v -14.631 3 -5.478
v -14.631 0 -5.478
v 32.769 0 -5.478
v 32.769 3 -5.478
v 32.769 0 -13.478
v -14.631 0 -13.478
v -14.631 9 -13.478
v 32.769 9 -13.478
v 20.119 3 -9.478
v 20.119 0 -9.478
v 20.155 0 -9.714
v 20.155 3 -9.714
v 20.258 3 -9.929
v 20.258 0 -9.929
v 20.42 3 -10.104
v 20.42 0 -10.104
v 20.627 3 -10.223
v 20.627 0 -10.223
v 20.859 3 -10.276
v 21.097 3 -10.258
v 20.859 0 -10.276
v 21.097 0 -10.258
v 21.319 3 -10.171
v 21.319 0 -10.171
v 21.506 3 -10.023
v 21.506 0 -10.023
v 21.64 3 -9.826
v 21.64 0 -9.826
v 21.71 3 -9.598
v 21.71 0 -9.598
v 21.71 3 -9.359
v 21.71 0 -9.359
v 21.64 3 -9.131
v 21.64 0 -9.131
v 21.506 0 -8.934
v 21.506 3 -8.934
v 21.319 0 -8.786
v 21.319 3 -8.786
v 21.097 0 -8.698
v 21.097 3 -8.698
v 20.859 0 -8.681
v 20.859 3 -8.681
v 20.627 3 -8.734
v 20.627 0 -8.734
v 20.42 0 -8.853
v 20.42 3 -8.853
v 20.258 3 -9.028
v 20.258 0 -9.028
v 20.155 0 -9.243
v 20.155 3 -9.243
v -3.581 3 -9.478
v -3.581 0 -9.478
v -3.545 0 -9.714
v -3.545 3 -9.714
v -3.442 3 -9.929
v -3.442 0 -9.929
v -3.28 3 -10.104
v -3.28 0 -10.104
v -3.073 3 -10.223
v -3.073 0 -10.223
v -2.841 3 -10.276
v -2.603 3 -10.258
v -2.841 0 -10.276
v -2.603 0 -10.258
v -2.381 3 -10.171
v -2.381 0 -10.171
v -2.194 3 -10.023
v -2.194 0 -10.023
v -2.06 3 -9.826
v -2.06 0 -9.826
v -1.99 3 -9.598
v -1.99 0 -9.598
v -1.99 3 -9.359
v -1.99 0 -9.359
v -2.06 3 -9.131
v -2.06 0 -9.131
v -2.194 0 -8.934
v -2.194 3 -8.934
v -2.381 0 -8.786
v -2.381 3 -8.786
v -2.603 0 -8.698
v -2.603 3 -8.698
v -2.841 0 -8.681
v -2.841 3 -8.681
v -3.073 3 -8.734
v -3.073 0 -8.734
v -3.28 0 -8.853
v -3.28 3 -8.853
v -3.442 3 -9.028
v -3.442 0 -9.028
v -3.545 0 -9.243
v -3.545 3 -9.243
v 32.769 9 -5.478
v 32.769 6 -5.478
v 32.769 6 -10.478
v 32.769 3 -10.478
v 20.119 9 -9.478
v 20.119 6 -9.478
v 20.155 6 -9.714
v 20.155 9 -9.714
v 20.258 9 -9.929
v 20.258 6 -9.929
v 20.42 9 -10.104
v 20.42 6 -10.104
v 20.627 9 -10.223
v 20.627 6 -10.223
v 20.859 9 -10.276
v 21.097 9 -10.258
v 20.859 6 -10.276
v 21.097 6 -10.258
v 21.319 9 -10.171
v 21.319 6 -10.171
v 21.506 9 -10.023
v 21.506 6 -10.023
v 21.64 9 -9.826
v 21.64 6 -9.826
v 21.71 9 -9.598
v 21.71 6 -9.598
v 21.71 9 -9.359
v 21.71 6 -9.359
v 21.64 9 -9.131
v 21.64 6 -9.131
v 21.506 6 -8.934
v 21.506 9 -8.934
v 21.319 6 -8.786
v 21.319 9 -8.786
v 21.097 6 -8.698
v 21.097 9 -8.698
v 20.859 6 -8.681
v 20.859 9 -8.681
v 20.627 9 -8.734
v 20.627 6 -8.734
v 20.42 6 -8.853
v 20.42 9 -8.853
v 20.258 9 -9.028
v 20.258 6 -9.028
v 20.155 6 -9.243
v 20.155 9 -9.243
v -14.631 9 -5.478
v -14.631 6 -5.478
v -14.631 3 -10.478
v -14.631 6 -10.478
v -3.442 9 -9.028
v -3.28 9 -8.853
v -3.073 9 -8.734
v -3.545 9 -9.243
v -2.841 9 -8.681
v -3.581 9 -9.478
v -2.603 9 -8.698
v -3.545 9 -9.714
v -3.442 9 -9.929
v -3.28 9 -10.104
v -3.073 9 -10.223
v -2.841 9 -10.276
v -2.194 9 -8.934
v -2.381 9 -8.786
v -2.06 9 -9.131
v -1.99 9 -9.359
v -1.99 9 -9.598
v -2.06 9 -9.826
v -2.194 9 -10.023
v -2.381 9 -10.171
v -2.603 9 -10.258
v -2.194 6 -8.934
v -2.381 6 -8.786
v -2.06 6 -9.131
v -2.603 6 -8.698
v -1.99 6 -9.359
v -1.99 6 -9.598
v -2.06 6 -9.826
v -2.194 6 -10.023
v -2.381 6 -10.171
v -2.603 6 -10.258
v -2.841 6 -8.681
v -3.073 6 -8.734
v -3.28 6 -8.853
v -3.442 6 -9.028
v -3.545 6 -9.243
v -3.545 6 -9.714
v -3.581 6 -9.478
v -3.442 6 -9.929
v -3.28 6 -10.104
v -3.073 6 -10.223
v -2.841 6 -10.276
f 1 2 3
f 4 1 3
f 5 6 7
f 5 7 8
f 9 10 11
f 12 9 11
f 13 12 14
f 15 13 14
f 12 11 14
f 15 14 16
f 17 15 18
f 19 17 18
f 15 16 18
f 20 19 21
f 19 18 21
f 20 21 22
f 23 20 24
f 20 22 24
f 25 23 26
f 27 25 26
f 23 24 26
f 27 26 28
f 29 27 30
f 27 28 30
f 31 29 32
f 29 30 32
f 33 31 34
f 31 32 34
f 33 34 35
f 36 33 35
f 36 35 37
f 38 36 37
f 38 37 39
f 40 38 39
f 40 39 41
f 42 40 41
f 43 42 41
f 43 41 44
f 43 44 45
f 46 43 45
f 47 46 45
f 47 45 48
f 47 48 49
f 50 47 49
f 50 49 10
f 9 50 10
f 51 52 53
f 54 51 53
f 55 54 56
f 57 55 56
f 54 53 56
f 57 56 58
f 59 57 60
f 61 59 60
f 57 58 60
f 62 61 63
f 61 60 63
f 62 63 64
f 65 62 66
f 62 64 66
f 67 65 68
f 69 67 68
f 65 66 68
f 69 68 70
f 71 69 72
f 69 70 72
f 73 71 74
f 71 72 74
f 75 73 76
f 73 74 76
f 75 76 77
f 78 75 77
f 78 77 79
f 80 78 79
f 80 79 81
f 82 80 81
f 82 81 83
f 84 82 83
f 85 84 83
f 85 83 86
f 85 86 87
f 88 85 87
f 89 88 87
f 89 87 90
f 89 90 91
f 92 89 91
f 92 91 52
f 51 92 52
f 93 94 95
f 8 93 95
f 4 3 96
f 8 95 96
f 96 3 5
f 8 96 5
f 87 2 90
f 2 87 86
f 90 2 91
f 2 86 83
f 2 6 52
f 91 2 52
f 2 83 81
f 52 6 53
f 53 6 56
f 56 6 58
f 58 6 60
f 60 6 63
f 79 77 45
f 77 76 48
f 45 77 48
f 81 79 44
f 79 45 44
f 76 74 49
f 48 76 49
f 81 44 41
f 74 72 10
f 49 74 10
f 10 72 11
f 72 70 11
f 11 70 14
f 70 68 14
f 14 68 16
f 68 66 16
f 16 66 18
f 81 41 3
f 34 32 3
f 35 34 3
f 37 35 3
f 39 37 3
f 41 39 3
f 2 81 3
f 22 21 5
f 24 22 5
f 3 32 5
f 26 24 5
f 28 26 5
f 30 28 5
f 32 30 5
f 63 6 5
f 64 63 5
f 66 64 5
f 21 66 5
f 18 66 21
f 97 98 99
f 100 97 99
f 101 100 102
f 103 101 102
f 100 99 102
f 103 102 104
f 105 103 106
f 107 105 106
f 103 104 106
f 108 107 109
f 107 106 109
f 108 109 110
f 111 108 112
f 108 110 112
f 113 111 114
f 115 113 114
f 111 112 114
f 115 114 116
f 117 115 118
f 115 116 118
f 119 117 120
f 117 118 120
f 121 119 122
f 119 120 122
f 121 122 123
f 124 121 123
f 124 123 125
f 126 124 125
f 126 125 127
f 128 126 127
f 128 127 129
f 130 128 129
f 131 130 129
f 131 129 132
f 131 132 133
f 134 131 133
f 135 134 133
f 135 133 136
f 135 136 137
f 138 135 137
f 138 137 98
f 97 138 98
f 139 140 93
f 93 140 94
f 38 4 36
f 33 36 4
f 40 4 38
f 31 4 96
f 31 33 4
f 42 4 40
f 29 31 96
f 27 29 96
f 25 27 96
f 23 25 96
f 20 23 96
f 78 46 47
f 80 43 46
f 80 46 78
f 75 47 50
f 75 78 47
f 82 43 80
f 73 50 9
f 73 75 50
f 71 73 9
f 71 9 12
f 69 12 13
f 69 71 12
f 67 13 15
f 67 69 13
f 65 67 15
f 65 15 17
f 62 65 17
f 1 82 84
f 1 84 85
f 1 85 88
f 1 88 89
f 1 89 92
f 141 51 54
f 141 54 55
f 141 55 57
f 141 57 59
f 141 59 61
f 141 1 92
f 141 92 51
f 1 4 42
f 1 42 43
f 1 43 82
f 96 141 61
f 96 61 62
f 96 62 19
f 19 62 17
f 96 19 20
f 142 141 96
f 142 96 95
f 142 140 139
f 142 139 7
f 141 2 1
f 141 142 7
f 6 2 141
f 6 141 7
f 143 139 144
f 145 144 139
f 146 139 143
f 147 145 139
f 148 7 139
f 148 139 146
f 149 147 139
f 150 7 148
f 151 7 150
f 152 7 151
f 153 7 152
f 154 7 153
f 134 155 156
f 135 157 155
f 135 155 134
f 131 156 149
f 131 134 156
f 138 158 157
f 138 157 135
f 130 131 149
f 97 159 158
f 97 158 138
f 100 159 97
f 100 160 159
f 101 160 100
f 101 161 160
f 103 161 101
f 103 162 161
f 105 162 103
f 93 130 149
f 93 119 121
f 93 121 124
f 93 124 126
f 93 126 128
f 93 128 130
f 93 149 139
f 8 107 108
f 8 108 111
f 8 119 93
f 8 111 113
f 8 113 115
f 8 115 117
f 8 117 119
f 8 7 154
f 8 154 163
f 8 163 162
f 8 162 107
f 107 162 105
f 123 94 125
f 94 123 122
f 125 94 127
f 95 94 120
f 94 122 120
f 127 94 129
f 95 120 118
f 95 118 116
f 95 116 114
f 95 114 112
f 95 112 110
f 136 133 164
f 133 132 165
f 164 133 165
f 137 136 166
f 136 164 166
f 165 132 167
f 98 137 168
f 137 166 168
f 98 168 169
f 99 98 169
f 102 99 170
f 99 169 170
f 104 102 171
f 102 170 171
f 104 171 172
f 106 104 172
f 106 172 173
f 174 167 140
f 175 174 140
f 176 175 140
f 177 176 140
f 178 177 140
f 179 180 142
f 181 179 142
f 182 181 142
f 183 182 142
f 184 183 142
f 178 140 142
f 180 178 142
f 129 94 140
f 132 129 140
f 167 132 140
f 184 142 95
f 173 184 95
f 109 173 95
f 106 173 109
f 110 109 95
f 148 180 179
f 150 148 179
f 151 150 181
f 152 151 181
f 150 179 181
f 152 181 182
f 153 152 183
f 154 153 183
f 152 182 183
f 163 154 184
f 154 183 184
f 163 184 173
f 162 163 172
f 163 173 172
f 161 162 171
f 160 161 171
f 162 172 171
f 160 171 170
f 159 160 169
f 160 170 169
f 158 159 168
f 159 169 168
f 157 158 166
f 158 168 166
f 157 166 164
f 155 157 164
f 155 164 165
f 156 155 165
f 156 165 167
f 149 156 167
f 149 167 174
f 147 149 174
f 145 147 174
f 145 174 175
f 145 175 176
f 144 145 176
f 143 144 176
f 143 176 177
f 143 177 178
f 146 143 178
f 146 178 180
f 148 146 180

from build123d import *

# Parameters (mm, degrees)
SKETCH1_W               = 47.4
SKETCH1_H               = 8
BOSS_EXTRUDE1_DEPTH     = 9
CUT_EXTRUDE1_DEPTH      = 17
CUT_EXTRUDE1_DEPTH_BACK = 58
SKETCH2_W               = 5
SKETCH2_H               = 3
M2X0_4_TAPPED_HOLE1_D   = 1.6


with BuildPart() as part:
    # Sketch1 → Boss-Extrude1 (new body)
    with BuildSketch(Plane(origin=(0, 0, 0), x_dir=(1, 0, 0), z_dir=(0, 1, 0))):
        with Locations((9.069133192, 9.478435518)):
            Rectangle(SKETCH1_W, SKETCH1_H)
    extrude(amount=BOSS_EXTRUDE1_DEPTH)

    # Sketch2 → Cut-Extrude1 (cut, two sides: drawn at the far end of the back side and taken through both)
    with BuildSketch(Plane(origin=(32.769133192, 0, 0), x_dir=(0, 0, -1), z_dir=(1, 0, 0)).offset(-CUT_EXTRUDE1_DEPTH_BACK)):
        with Locations((7.978435518, 4.5)):
            Rectangle(SKETCH2_W, SKETCH2_H)
    extrude(amount=CUT_EXTRUDE1_DEPTH + CUT_EXTRUDE1_DEPTH_BACK, mode=Mode.SUBTRACT)

    # M2x0.4 Tapped Hole1 (through all)
    with Locations(Plane(origin=(0, 9, 0), x_dir=(1, 0, 0), z_dir=(0, 1, 0))):
        with Locations((-2.780866808, 9.478435518), (20.919133192, 9.478435518)):
            Hole(M2X0_4_TAPPED_HOLE1_D / 2)


solid = part.part
